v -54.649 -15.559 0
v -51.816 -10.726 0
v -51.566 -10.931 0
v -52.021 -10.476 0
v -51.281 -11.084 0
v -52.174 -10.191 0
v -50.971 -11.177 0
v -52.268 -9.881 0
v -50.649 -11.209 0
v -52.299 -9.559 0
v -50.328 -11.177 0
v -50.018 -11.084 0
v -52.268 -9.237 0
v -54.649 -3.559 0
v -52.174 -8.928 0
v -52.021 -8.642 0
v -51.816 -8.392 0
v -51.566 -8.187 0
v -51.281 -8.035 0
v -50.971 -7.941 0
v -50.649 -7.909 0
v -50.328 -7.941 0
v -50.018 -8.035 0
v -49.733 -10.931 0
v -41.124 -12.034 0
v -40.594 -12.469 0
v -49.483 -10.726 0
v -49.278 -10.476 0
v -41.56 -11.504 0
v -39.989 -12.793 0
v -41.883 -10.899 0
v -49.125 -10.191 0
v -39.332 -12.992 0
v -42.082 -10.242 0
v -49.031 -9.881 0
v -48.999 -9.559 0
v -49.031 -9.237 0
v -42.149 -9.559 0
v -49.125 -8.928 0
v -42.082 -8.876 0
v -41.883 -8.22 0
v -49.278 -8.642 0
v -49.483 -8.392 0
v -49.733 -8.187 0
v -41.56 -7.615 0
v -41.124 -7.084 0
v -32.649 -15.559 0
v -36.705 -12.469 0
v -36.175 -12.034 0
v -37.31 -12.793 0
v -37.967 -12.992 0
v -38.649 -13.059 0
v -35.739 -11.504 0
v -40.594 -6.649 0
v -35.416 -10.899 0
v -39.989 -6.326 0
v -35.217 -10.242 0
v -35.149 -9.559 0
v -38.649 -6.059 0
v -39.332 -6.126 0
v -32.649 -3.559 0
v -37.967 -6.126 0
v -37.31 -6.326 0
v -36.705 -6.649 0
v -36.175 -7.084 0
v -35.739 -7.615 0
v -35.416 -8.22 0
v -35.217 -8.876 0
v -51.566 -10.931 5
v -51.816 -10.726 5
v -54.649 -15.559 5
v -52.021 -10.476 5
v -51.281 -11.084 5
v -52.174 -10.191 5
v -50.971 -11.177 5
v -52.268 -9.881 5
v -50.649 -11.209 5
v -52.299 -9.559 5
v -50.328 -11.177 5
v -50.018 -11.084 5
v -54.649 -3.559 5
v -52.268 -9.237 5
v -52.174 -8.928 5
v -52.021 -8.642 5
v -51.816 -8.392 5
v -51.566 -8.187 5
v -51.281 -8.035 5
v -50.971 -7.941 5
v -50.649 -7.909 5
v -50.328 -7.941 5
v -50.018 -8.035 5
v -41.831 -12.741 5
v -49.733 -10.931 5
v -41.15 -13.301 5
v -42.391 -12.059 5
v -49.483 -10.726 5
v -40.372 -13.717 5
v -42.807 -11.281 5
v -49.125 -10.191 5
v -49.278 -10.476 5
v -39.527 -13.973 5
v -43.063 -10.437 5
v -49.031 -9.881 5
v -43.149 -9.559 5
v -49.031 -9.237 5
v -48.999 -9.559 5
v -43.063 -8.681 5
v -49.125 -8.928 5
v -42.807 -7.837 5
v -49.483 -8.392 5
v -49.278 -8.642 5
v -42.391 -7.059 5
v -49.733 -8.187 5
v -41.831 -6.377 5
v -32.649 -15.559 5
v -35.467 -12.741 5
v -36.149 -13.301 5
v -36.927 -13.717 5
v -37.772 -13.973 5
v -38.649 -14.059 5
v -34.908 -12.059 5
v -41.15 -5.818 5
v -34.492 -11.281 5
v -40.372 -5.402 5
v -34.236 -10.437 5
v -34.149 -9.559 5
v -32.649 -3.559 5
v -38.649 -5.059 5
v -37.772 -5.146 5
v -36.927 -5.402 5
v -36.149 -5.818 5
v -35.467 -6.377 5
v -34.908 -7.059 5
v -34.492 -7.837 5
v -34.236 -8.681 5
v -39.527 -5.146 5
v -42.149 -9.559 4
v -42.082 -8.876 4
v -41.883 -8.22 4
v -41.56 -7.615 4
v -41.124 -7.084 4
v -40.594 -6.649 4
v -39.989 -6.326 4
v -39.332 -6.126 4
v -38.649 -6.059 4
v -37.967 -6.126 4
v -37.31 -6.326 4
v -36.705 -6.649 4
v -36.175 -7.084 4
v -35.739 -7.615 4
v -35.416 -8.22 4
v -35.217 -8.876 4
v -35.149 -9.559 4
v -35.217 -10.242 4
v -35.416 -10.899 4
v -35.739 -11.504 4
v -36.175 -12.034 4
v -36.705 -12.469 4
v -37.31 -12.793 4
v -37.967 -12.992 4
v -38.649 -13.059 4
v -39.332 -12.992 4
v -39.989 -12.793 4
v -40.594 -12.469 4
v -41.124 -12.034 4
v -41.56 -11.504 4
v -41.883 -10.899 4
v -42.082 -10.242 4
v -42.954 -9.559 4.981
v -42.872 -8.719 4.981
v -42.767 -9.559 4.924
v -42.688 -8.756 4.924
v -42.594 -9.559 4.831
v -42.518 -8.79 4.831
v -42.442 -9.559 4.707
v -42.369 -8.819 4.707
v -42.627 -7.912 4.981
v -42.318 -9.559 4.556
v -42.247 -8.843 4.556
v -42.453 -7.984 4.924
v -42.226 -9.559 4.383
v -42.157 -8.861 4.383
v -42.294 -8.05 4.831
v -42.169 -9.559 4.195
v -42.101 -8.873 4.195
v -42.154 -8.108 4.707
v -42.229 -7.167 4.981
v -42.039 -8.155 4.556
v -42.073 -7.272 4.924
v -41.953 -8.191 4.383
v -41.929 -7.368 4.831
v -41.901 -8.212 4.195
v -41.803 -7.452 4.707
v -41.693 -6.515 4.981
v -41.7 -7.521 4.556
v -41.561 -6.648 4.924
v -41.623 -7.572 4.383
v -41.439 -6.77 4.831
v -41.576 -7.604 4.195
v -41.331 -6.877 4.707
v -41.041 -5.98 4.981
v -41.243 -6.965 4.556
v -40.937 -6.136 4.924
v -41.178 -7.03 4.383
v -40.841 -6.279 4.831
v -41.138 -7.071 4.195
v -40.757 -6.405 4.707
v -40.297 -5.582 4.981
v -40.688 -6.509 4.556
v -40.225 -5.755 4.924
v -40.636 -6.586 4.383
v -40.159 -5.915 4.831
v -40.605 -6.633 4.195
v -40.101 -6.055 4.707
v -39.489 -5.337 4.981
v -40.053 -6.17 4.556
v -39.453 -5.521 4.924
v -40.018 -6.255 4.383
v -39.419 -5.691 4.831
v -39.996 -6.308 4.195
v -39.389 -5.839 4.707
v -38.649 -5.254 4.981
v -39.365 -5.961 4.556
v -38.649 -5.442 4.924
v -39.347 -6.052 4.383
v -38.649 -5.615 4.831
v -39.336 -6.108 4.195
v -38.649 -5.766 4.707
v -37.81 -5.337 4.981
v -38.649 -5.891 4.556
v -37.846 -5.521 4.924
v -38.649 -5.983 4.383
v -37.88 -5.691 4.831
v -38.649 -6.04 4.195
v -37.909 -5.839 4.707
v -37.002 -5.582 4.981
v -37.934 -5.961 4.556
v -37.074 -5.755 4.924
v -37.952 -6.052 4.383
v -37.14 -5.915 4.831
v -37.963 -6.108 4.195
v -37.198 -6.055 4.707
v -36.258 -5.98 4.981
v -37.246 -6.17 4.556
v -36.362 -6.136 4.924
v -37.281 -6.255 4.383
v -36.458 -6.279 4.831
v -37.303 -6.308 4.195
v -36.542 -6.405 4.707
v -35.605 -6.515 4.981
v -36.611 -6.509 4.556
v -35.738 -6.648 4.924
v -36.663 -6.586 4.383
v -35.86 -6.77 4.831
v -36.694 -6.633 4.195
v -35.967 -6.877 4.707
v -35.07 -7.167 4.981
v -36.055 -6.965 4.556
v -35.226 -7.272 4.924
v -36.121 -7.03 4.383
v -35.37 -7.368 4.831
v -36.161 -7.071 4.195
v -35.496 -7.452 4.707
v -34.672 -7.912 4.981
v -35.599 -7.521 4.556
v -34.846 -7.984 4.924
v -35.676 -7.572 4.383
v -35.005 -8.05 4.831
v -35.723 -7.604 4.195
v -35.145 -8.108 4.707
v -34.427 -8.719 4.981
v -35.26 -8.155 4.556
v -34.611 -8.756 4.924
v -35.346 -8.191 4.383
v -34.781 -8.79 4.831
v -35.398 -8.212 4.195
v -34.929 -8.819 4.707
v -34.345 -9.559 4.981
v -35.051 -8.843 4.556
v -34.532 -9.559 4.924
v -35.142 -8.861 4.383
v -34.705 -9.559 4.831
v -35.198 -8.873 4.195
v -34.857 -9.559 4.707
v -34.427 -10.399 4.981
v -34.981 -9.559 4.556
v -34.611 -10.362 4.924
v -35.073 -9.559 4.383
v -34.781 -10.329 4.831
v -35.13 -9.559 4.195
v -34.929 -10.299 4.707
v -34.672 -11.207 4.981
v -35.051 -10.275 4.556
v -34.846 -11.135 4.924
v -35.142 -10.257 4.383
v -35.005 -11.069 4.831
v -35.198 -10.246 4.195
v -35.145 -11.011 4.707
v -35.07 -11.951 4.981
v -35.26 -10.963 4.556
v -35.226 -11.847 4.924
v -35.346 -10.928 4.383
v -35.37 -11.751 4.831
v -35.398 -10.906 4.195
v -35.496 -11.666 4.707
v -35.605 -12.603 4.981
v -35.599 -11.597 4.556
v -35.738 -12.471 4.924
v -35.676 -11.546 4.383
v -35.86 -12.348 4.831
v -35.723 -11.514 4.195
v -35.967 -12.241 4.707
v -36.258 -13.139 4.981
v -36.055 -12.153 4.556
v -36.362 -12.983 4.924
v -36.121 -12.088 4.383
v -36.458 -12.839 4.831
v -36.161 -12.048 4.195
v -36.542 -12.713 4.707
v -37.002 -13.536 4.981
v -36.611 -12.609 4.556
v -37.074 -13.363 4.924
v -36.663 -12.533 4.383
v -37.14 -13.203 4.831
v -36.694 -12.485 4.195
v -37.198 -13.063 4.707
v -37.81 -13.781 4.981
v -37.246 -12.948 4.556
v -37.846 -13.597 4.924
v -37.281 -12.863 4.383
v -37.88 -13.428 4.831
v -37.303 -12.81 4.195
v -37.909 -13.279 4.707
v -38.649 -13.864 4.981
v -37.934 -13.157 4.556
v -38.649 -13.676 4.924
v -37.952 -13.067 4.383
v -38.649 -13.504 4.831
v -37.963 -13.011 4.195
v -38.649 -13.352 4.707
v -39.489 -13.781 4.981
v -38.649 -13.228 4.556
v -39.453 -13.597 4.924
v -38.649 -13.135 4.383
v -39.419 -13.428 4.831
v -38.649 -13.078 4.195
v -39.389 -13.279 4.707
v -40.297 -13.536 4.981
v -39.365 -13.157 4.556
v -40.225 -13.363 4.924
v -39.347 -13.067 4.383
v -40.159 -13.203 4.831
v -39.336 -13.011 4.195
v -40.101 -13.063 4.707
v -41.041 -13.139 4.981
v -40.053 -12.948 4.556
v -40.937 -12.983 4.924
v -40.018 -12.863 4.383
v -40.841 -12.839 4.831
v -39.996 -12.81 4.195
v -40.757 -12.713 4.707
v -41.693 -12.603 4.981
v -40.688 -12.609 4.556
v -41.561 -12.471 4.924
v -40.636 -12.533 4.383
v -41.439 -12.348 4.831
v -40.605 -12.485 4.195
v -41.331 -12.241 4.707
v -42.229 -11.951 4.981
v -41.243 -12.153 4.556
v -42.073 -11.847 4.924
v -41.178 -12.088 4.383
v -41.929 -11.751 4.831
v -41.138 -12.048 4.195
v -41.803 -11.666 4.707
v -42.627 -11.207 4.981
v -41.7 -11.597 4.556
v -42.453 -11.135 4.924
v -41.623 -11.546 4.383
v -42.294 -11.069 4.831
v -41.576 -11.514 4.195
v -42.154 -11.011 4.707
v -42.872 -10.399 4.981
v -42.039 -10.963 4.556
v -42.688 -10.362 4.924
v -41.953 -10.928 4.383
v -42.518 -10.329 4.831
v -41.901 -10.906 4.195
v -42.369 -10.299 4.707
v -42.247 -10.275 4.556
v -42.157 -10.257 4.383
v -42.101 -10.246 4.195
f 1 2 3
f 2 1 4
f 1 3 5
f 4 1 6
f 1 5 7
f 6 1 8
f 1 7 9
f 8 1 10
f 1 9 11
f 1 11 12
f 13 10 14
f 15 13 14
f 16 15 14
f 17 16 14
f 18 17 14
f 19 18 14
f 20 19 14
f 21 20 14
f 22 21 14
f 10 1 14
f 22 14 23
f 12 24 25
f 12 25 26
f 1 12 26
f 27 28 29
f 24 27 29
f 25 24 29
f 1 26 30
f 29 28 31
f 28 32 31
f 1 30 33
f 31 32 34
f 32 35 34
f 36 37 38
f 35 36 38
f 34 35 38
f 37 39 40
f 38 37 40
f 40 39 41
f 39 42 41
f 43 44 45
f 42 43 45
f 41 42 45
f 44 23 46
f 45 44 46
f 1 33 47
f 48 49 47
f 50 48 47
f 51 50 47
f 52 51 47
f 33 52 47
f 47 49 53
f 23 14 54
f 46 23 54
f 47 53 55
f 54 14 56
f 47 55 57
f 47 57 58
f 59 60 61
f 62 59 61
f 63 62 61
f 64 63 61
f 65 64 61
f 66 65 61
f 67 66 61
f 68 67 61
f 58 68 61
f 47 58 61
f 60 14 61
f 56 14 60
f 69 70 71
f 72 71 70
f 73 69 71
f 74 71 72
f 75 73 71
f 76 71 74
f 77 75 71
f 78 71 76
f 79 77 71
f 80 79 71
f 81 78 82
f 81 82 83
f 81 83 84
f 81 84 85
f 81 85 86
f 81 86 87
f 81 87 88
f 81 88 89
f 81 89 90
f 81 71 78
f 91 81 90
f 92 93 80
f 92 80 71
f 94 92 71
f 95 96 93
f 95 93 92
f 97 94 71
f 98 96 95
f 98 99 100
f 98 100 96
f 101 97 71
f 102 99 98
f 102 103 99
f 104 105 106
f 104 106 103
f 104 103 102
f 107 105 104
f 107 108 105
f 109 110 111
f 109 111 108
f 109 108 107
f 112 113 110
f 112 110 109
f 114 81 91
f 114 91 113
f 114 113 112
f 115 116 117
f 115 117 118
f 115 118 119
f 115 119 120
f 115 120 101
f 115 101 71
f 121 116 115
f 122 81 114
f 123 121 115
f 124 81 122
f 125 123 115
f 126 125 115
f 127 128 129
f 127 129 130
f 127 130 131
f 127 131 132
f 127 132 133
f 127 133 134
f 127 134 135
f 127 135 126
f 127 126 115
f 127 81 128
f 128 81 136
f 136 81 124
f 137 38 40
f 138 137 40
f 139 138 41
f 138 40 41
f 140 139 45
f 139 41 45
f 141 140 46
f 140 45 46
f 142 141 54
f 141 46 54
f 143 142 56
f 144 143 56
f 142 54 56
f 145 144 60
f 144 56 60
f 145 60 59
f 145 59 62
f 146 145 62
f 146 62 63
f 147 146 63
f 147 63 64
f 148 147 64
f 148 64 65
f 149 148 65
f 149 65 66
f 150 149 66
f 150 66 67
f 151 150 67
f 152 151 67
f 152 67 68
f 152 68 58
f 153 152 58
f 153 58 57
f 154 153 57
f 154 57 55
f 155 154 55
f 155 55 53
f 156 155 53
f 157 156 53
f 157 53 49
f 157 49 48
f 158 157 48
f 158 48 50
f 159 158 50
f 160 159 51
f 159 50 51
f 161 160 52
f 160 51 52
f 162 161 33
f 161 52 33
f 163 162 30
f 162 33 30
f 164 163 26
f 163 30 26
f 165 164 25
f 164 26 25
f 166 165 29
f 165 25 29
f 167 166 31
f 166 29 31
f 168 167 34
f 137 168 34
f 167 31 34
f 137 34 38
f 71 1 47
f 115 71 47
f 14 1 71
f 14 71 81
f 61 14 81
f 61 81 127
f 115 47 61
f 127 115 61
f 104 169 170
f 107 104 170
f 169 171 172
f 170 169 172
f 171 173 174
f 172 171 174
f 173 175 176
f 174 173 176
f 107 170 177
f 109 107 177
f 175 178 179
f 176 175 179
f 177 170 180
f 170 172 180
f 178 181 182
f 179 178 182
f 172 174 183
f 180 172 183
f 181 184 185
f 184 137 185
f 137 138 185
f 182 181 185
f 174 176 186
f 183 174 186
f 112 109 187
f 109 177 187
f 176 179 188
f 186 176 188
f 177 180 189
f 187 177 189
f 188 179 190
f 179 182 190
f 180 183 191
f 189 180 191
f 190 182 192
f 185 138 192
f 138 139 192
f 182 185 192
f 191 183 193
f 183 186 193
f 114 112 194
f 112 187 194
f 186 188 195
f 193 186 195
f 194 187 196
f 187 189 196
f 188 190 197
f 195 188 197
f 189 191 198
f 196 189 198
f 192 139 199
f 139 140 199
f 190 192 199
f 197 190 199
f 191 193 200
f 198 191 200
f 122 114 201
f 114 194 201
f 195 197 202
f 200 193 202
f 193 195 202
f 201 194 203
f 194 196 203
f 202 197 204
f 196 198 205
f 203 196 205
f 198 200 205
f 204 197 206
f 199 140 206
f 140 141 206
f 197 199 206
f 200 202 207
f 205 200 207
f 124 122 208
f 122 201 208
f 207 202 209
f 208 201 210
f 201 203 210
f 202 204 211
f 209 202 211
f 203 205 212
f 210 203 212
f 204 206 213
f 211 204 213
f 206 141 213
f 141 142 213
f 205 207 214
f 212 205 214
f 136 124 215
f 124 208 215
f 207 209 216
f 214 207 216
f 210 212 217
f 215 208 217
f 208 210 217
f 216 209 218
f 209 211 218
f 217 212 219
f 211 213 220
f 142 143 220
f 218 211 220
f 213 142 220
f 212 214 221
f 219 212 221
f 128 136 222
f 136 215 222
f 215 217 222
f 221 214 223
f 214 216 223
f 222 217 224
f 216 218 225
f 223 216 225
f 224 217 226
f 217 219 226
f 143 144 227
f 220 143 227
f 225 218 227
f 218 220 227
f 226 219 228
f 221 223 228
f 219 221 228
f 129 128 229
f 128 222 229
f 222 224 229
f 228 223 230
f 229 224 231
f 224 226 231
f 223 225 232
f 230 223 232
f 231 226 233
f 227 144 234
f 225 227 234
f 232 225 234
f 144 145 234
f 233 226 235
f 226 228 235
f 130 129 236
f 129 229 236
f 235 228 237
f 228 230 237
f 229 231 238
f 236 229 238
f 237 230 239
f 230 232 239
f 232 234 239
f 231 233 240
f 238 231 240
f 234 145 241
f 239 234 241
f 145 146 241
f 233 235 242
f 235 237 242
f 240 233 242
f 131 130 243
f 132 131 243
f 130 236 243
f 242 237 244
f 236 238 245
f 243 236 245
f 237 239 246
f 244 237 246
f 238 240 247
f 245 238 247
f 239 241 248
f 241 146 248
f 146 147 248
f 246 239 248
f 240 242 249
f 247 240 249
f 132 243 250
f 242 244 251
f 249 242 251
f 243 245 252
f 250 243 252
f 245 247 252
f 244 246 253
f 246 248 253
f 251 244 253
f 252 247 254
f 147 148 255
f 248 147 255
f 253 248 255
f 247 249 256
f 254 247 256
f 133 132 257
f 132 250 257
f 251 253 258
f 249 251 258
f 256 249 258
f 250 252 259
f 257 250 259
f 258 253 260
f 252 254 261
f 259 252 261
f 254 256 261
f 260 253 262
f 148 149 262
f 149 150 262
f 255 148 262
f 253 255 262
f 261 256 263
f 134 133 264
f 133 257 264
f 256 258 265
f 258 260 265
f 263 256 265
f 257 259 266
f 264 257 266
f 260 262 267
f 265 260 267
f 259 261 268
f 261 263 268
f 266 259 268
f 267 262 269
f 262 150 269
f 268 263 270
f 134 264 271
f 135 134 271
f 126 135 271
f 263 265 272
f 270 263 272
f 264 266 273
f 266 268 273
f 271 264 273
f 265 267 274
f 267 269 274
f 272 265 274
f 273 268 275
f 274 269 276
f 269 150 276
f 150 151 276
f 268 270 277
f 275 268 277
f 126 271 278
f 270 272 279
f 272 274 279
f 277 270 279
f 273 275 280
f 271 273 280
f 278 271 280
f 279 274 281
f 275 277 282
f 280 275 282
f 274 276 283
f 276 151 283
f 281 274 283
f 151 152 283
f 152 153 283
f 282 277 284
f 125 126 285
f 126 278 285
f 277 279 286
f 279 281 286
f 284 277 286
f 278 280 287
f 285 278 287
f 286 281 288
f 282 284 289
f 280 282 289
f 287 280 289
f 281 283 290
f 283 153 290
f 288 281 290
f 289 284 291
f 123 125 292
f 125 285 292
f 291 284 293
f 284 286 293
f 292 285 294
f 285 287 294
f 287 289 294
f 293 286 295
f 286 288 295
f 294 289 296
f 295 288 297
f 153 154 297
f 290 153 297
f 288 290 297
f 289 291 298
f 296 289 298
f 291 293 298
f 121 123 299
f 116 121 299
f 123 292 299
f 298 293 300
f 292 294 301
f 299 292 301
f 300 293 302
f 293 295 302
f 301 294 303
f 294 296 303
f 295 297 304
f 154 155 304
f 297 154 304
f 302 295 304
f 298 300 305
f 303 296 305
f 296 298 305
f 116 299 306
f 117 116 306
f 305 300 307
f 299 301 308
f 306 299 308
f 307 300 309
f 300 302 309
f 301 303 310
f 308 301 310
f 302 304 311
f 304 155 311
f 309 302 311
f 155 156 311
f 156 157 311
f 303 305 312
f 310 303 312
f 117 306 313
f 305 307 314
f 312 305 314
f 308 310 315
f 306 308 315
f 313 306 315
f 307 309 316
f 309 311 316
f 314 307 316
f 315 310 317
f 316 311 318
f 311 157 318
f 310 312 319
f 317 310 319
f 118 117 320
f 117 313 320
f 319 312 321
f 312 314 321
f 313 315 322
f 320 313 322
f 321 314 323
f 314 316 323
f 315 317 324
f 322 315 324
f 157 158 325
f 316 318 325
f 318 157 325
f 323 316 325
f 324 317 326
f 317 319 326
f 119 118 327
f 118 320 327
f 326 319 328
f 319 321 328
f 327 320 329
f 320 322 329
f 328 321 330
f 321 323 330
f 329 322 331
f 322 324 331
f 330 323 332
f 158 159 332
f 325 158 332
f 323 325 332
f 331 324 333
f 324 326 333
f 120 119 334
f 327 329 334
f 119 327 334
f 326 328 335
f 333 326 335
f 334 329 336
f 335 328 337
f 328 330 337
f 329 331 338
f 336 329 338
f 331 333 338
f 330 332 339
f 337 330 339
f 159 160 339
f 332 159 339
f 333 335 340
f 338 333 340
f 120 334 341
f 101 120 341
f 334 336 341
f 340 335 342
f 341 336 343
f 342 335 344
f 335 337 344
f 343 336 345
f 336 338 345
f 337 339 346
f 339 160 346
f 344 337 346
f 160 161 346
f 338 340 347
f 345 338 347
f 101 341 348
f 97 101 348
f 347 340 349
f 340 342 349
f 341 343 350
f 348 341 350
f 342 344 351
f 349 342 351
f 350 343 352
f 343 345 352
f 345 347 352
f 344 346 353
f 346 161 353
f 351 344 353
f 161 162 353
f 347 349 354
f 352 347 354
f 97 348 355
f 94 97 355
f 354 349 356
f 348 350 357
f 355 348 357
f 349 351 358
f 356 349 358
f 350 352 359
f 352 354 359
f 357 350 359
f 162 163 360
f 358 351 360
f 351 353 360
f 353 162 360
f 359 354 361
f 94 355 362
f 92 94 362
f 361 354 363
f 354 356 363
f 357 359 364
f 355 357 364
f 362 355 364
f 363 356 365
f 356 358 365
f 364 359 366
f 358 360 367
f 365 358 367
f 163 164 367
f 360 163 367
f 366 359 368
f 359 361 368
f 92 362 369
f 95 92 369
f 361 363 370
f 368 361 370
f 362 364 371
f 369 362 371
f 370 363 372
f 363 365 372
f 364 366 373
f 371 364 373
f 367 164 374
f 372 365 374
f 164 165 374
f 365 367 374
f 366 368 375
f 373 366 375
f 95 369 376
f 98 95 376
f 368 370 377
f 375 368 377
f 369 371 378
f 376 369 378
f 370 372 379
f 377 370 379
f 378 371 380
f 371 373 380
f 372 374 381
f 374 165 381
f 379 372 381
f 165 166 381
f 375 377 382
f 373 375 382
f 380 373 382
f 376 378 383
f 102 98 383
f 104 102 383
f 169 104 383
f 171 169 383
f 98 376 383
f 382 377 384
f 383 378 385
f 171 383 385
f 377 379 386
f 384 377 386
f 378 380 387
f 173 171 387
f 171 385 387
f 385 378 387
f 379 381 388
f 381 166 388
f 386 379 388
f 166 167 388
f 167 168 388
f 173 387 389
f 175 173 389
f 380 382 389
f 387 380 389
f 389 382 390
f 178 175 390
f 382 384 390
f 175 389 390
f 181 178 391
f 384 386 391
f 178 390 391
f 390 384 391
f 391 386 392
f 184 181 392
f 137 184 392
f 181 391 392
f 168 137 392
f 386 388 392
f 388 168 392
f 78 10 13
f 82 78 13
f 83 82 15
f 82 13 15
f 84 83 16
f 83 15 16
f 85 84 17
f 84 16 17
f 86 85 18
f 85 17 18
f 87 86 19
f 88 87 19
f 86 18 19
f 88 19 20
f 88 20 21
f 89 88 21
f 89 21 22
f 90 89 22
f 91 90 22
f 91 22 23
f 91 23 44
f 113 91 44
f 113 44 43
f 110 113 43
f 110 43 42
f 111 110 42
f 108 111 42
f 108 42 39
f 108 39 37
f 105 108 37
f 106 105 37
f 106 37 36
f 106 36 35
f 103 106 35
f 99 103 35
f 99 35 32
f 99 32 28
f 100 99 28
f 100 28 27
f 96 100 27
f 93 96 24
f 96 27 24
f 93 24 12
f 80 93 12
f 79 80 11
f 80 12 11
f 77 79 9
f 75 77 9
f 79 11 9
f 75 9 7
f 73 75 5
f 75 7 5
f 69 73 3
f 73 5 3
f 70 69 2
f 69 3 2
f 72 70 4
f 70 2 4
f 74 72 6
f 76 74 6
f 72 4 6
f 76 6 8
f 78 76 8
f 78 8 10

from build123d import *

# Parameters (mm, degrees)
ESBO_O1_W                                  = 22
ESBO_O1_H                                  = 12
RESSALTO_EXTRUS_O1_DEPTH                   = 5
BROCA_DE_ROSQUEAR_PARA_TARRAXA_DE_M8X1_0_D = 7
BROCA_DE_ROSQUEAR_PARA_TARRAXA_DE_M4X0_7_D = 3.3
FILETE1_R                                  = 1


with BuildPart() as part:
    # Esboço1 → Ressalto-extrusão1 (new body)
    with BuildSketch(Plane.XY):
        with Locations((-43.64943678, -9.559141583)):
            Rectangle(ESBO_O1_W, ESBO_O1_H)
    extrude(amount=RESSALTO_EXTRUS_O1_DEPTH)

    # Broca de rosquear para tarraxa de M8x1.01 (through all)
    with Locations(Plane.XY.offset(5)):
        with Locations((-38.64943678, -9.559141583)):
            Hole(BROCA_DE_ROSQUEAR_PARA_TARRAXA_DE_M8X1_0_D / 2)

    # Broca de rosquear para tarraxa de M4x0.71 (through all)
    with Locations(Plane.XY.offset(5)):
        with Locations((-50.64943678, -9.559141583)):
            Hole(BROCA_DE_ROSQUEAR_PARA_TARRAXA_DE_M4X0_7_D / 2)

    # Filete1
    filete1_edges = [part.edges().sort_by_distance(p)[0] for p in [
        (-35.14943678, -9.559141583, 5),
    ]]
    fillet(filete1_edges, radius=FILETE1_R)


solid = part.part
